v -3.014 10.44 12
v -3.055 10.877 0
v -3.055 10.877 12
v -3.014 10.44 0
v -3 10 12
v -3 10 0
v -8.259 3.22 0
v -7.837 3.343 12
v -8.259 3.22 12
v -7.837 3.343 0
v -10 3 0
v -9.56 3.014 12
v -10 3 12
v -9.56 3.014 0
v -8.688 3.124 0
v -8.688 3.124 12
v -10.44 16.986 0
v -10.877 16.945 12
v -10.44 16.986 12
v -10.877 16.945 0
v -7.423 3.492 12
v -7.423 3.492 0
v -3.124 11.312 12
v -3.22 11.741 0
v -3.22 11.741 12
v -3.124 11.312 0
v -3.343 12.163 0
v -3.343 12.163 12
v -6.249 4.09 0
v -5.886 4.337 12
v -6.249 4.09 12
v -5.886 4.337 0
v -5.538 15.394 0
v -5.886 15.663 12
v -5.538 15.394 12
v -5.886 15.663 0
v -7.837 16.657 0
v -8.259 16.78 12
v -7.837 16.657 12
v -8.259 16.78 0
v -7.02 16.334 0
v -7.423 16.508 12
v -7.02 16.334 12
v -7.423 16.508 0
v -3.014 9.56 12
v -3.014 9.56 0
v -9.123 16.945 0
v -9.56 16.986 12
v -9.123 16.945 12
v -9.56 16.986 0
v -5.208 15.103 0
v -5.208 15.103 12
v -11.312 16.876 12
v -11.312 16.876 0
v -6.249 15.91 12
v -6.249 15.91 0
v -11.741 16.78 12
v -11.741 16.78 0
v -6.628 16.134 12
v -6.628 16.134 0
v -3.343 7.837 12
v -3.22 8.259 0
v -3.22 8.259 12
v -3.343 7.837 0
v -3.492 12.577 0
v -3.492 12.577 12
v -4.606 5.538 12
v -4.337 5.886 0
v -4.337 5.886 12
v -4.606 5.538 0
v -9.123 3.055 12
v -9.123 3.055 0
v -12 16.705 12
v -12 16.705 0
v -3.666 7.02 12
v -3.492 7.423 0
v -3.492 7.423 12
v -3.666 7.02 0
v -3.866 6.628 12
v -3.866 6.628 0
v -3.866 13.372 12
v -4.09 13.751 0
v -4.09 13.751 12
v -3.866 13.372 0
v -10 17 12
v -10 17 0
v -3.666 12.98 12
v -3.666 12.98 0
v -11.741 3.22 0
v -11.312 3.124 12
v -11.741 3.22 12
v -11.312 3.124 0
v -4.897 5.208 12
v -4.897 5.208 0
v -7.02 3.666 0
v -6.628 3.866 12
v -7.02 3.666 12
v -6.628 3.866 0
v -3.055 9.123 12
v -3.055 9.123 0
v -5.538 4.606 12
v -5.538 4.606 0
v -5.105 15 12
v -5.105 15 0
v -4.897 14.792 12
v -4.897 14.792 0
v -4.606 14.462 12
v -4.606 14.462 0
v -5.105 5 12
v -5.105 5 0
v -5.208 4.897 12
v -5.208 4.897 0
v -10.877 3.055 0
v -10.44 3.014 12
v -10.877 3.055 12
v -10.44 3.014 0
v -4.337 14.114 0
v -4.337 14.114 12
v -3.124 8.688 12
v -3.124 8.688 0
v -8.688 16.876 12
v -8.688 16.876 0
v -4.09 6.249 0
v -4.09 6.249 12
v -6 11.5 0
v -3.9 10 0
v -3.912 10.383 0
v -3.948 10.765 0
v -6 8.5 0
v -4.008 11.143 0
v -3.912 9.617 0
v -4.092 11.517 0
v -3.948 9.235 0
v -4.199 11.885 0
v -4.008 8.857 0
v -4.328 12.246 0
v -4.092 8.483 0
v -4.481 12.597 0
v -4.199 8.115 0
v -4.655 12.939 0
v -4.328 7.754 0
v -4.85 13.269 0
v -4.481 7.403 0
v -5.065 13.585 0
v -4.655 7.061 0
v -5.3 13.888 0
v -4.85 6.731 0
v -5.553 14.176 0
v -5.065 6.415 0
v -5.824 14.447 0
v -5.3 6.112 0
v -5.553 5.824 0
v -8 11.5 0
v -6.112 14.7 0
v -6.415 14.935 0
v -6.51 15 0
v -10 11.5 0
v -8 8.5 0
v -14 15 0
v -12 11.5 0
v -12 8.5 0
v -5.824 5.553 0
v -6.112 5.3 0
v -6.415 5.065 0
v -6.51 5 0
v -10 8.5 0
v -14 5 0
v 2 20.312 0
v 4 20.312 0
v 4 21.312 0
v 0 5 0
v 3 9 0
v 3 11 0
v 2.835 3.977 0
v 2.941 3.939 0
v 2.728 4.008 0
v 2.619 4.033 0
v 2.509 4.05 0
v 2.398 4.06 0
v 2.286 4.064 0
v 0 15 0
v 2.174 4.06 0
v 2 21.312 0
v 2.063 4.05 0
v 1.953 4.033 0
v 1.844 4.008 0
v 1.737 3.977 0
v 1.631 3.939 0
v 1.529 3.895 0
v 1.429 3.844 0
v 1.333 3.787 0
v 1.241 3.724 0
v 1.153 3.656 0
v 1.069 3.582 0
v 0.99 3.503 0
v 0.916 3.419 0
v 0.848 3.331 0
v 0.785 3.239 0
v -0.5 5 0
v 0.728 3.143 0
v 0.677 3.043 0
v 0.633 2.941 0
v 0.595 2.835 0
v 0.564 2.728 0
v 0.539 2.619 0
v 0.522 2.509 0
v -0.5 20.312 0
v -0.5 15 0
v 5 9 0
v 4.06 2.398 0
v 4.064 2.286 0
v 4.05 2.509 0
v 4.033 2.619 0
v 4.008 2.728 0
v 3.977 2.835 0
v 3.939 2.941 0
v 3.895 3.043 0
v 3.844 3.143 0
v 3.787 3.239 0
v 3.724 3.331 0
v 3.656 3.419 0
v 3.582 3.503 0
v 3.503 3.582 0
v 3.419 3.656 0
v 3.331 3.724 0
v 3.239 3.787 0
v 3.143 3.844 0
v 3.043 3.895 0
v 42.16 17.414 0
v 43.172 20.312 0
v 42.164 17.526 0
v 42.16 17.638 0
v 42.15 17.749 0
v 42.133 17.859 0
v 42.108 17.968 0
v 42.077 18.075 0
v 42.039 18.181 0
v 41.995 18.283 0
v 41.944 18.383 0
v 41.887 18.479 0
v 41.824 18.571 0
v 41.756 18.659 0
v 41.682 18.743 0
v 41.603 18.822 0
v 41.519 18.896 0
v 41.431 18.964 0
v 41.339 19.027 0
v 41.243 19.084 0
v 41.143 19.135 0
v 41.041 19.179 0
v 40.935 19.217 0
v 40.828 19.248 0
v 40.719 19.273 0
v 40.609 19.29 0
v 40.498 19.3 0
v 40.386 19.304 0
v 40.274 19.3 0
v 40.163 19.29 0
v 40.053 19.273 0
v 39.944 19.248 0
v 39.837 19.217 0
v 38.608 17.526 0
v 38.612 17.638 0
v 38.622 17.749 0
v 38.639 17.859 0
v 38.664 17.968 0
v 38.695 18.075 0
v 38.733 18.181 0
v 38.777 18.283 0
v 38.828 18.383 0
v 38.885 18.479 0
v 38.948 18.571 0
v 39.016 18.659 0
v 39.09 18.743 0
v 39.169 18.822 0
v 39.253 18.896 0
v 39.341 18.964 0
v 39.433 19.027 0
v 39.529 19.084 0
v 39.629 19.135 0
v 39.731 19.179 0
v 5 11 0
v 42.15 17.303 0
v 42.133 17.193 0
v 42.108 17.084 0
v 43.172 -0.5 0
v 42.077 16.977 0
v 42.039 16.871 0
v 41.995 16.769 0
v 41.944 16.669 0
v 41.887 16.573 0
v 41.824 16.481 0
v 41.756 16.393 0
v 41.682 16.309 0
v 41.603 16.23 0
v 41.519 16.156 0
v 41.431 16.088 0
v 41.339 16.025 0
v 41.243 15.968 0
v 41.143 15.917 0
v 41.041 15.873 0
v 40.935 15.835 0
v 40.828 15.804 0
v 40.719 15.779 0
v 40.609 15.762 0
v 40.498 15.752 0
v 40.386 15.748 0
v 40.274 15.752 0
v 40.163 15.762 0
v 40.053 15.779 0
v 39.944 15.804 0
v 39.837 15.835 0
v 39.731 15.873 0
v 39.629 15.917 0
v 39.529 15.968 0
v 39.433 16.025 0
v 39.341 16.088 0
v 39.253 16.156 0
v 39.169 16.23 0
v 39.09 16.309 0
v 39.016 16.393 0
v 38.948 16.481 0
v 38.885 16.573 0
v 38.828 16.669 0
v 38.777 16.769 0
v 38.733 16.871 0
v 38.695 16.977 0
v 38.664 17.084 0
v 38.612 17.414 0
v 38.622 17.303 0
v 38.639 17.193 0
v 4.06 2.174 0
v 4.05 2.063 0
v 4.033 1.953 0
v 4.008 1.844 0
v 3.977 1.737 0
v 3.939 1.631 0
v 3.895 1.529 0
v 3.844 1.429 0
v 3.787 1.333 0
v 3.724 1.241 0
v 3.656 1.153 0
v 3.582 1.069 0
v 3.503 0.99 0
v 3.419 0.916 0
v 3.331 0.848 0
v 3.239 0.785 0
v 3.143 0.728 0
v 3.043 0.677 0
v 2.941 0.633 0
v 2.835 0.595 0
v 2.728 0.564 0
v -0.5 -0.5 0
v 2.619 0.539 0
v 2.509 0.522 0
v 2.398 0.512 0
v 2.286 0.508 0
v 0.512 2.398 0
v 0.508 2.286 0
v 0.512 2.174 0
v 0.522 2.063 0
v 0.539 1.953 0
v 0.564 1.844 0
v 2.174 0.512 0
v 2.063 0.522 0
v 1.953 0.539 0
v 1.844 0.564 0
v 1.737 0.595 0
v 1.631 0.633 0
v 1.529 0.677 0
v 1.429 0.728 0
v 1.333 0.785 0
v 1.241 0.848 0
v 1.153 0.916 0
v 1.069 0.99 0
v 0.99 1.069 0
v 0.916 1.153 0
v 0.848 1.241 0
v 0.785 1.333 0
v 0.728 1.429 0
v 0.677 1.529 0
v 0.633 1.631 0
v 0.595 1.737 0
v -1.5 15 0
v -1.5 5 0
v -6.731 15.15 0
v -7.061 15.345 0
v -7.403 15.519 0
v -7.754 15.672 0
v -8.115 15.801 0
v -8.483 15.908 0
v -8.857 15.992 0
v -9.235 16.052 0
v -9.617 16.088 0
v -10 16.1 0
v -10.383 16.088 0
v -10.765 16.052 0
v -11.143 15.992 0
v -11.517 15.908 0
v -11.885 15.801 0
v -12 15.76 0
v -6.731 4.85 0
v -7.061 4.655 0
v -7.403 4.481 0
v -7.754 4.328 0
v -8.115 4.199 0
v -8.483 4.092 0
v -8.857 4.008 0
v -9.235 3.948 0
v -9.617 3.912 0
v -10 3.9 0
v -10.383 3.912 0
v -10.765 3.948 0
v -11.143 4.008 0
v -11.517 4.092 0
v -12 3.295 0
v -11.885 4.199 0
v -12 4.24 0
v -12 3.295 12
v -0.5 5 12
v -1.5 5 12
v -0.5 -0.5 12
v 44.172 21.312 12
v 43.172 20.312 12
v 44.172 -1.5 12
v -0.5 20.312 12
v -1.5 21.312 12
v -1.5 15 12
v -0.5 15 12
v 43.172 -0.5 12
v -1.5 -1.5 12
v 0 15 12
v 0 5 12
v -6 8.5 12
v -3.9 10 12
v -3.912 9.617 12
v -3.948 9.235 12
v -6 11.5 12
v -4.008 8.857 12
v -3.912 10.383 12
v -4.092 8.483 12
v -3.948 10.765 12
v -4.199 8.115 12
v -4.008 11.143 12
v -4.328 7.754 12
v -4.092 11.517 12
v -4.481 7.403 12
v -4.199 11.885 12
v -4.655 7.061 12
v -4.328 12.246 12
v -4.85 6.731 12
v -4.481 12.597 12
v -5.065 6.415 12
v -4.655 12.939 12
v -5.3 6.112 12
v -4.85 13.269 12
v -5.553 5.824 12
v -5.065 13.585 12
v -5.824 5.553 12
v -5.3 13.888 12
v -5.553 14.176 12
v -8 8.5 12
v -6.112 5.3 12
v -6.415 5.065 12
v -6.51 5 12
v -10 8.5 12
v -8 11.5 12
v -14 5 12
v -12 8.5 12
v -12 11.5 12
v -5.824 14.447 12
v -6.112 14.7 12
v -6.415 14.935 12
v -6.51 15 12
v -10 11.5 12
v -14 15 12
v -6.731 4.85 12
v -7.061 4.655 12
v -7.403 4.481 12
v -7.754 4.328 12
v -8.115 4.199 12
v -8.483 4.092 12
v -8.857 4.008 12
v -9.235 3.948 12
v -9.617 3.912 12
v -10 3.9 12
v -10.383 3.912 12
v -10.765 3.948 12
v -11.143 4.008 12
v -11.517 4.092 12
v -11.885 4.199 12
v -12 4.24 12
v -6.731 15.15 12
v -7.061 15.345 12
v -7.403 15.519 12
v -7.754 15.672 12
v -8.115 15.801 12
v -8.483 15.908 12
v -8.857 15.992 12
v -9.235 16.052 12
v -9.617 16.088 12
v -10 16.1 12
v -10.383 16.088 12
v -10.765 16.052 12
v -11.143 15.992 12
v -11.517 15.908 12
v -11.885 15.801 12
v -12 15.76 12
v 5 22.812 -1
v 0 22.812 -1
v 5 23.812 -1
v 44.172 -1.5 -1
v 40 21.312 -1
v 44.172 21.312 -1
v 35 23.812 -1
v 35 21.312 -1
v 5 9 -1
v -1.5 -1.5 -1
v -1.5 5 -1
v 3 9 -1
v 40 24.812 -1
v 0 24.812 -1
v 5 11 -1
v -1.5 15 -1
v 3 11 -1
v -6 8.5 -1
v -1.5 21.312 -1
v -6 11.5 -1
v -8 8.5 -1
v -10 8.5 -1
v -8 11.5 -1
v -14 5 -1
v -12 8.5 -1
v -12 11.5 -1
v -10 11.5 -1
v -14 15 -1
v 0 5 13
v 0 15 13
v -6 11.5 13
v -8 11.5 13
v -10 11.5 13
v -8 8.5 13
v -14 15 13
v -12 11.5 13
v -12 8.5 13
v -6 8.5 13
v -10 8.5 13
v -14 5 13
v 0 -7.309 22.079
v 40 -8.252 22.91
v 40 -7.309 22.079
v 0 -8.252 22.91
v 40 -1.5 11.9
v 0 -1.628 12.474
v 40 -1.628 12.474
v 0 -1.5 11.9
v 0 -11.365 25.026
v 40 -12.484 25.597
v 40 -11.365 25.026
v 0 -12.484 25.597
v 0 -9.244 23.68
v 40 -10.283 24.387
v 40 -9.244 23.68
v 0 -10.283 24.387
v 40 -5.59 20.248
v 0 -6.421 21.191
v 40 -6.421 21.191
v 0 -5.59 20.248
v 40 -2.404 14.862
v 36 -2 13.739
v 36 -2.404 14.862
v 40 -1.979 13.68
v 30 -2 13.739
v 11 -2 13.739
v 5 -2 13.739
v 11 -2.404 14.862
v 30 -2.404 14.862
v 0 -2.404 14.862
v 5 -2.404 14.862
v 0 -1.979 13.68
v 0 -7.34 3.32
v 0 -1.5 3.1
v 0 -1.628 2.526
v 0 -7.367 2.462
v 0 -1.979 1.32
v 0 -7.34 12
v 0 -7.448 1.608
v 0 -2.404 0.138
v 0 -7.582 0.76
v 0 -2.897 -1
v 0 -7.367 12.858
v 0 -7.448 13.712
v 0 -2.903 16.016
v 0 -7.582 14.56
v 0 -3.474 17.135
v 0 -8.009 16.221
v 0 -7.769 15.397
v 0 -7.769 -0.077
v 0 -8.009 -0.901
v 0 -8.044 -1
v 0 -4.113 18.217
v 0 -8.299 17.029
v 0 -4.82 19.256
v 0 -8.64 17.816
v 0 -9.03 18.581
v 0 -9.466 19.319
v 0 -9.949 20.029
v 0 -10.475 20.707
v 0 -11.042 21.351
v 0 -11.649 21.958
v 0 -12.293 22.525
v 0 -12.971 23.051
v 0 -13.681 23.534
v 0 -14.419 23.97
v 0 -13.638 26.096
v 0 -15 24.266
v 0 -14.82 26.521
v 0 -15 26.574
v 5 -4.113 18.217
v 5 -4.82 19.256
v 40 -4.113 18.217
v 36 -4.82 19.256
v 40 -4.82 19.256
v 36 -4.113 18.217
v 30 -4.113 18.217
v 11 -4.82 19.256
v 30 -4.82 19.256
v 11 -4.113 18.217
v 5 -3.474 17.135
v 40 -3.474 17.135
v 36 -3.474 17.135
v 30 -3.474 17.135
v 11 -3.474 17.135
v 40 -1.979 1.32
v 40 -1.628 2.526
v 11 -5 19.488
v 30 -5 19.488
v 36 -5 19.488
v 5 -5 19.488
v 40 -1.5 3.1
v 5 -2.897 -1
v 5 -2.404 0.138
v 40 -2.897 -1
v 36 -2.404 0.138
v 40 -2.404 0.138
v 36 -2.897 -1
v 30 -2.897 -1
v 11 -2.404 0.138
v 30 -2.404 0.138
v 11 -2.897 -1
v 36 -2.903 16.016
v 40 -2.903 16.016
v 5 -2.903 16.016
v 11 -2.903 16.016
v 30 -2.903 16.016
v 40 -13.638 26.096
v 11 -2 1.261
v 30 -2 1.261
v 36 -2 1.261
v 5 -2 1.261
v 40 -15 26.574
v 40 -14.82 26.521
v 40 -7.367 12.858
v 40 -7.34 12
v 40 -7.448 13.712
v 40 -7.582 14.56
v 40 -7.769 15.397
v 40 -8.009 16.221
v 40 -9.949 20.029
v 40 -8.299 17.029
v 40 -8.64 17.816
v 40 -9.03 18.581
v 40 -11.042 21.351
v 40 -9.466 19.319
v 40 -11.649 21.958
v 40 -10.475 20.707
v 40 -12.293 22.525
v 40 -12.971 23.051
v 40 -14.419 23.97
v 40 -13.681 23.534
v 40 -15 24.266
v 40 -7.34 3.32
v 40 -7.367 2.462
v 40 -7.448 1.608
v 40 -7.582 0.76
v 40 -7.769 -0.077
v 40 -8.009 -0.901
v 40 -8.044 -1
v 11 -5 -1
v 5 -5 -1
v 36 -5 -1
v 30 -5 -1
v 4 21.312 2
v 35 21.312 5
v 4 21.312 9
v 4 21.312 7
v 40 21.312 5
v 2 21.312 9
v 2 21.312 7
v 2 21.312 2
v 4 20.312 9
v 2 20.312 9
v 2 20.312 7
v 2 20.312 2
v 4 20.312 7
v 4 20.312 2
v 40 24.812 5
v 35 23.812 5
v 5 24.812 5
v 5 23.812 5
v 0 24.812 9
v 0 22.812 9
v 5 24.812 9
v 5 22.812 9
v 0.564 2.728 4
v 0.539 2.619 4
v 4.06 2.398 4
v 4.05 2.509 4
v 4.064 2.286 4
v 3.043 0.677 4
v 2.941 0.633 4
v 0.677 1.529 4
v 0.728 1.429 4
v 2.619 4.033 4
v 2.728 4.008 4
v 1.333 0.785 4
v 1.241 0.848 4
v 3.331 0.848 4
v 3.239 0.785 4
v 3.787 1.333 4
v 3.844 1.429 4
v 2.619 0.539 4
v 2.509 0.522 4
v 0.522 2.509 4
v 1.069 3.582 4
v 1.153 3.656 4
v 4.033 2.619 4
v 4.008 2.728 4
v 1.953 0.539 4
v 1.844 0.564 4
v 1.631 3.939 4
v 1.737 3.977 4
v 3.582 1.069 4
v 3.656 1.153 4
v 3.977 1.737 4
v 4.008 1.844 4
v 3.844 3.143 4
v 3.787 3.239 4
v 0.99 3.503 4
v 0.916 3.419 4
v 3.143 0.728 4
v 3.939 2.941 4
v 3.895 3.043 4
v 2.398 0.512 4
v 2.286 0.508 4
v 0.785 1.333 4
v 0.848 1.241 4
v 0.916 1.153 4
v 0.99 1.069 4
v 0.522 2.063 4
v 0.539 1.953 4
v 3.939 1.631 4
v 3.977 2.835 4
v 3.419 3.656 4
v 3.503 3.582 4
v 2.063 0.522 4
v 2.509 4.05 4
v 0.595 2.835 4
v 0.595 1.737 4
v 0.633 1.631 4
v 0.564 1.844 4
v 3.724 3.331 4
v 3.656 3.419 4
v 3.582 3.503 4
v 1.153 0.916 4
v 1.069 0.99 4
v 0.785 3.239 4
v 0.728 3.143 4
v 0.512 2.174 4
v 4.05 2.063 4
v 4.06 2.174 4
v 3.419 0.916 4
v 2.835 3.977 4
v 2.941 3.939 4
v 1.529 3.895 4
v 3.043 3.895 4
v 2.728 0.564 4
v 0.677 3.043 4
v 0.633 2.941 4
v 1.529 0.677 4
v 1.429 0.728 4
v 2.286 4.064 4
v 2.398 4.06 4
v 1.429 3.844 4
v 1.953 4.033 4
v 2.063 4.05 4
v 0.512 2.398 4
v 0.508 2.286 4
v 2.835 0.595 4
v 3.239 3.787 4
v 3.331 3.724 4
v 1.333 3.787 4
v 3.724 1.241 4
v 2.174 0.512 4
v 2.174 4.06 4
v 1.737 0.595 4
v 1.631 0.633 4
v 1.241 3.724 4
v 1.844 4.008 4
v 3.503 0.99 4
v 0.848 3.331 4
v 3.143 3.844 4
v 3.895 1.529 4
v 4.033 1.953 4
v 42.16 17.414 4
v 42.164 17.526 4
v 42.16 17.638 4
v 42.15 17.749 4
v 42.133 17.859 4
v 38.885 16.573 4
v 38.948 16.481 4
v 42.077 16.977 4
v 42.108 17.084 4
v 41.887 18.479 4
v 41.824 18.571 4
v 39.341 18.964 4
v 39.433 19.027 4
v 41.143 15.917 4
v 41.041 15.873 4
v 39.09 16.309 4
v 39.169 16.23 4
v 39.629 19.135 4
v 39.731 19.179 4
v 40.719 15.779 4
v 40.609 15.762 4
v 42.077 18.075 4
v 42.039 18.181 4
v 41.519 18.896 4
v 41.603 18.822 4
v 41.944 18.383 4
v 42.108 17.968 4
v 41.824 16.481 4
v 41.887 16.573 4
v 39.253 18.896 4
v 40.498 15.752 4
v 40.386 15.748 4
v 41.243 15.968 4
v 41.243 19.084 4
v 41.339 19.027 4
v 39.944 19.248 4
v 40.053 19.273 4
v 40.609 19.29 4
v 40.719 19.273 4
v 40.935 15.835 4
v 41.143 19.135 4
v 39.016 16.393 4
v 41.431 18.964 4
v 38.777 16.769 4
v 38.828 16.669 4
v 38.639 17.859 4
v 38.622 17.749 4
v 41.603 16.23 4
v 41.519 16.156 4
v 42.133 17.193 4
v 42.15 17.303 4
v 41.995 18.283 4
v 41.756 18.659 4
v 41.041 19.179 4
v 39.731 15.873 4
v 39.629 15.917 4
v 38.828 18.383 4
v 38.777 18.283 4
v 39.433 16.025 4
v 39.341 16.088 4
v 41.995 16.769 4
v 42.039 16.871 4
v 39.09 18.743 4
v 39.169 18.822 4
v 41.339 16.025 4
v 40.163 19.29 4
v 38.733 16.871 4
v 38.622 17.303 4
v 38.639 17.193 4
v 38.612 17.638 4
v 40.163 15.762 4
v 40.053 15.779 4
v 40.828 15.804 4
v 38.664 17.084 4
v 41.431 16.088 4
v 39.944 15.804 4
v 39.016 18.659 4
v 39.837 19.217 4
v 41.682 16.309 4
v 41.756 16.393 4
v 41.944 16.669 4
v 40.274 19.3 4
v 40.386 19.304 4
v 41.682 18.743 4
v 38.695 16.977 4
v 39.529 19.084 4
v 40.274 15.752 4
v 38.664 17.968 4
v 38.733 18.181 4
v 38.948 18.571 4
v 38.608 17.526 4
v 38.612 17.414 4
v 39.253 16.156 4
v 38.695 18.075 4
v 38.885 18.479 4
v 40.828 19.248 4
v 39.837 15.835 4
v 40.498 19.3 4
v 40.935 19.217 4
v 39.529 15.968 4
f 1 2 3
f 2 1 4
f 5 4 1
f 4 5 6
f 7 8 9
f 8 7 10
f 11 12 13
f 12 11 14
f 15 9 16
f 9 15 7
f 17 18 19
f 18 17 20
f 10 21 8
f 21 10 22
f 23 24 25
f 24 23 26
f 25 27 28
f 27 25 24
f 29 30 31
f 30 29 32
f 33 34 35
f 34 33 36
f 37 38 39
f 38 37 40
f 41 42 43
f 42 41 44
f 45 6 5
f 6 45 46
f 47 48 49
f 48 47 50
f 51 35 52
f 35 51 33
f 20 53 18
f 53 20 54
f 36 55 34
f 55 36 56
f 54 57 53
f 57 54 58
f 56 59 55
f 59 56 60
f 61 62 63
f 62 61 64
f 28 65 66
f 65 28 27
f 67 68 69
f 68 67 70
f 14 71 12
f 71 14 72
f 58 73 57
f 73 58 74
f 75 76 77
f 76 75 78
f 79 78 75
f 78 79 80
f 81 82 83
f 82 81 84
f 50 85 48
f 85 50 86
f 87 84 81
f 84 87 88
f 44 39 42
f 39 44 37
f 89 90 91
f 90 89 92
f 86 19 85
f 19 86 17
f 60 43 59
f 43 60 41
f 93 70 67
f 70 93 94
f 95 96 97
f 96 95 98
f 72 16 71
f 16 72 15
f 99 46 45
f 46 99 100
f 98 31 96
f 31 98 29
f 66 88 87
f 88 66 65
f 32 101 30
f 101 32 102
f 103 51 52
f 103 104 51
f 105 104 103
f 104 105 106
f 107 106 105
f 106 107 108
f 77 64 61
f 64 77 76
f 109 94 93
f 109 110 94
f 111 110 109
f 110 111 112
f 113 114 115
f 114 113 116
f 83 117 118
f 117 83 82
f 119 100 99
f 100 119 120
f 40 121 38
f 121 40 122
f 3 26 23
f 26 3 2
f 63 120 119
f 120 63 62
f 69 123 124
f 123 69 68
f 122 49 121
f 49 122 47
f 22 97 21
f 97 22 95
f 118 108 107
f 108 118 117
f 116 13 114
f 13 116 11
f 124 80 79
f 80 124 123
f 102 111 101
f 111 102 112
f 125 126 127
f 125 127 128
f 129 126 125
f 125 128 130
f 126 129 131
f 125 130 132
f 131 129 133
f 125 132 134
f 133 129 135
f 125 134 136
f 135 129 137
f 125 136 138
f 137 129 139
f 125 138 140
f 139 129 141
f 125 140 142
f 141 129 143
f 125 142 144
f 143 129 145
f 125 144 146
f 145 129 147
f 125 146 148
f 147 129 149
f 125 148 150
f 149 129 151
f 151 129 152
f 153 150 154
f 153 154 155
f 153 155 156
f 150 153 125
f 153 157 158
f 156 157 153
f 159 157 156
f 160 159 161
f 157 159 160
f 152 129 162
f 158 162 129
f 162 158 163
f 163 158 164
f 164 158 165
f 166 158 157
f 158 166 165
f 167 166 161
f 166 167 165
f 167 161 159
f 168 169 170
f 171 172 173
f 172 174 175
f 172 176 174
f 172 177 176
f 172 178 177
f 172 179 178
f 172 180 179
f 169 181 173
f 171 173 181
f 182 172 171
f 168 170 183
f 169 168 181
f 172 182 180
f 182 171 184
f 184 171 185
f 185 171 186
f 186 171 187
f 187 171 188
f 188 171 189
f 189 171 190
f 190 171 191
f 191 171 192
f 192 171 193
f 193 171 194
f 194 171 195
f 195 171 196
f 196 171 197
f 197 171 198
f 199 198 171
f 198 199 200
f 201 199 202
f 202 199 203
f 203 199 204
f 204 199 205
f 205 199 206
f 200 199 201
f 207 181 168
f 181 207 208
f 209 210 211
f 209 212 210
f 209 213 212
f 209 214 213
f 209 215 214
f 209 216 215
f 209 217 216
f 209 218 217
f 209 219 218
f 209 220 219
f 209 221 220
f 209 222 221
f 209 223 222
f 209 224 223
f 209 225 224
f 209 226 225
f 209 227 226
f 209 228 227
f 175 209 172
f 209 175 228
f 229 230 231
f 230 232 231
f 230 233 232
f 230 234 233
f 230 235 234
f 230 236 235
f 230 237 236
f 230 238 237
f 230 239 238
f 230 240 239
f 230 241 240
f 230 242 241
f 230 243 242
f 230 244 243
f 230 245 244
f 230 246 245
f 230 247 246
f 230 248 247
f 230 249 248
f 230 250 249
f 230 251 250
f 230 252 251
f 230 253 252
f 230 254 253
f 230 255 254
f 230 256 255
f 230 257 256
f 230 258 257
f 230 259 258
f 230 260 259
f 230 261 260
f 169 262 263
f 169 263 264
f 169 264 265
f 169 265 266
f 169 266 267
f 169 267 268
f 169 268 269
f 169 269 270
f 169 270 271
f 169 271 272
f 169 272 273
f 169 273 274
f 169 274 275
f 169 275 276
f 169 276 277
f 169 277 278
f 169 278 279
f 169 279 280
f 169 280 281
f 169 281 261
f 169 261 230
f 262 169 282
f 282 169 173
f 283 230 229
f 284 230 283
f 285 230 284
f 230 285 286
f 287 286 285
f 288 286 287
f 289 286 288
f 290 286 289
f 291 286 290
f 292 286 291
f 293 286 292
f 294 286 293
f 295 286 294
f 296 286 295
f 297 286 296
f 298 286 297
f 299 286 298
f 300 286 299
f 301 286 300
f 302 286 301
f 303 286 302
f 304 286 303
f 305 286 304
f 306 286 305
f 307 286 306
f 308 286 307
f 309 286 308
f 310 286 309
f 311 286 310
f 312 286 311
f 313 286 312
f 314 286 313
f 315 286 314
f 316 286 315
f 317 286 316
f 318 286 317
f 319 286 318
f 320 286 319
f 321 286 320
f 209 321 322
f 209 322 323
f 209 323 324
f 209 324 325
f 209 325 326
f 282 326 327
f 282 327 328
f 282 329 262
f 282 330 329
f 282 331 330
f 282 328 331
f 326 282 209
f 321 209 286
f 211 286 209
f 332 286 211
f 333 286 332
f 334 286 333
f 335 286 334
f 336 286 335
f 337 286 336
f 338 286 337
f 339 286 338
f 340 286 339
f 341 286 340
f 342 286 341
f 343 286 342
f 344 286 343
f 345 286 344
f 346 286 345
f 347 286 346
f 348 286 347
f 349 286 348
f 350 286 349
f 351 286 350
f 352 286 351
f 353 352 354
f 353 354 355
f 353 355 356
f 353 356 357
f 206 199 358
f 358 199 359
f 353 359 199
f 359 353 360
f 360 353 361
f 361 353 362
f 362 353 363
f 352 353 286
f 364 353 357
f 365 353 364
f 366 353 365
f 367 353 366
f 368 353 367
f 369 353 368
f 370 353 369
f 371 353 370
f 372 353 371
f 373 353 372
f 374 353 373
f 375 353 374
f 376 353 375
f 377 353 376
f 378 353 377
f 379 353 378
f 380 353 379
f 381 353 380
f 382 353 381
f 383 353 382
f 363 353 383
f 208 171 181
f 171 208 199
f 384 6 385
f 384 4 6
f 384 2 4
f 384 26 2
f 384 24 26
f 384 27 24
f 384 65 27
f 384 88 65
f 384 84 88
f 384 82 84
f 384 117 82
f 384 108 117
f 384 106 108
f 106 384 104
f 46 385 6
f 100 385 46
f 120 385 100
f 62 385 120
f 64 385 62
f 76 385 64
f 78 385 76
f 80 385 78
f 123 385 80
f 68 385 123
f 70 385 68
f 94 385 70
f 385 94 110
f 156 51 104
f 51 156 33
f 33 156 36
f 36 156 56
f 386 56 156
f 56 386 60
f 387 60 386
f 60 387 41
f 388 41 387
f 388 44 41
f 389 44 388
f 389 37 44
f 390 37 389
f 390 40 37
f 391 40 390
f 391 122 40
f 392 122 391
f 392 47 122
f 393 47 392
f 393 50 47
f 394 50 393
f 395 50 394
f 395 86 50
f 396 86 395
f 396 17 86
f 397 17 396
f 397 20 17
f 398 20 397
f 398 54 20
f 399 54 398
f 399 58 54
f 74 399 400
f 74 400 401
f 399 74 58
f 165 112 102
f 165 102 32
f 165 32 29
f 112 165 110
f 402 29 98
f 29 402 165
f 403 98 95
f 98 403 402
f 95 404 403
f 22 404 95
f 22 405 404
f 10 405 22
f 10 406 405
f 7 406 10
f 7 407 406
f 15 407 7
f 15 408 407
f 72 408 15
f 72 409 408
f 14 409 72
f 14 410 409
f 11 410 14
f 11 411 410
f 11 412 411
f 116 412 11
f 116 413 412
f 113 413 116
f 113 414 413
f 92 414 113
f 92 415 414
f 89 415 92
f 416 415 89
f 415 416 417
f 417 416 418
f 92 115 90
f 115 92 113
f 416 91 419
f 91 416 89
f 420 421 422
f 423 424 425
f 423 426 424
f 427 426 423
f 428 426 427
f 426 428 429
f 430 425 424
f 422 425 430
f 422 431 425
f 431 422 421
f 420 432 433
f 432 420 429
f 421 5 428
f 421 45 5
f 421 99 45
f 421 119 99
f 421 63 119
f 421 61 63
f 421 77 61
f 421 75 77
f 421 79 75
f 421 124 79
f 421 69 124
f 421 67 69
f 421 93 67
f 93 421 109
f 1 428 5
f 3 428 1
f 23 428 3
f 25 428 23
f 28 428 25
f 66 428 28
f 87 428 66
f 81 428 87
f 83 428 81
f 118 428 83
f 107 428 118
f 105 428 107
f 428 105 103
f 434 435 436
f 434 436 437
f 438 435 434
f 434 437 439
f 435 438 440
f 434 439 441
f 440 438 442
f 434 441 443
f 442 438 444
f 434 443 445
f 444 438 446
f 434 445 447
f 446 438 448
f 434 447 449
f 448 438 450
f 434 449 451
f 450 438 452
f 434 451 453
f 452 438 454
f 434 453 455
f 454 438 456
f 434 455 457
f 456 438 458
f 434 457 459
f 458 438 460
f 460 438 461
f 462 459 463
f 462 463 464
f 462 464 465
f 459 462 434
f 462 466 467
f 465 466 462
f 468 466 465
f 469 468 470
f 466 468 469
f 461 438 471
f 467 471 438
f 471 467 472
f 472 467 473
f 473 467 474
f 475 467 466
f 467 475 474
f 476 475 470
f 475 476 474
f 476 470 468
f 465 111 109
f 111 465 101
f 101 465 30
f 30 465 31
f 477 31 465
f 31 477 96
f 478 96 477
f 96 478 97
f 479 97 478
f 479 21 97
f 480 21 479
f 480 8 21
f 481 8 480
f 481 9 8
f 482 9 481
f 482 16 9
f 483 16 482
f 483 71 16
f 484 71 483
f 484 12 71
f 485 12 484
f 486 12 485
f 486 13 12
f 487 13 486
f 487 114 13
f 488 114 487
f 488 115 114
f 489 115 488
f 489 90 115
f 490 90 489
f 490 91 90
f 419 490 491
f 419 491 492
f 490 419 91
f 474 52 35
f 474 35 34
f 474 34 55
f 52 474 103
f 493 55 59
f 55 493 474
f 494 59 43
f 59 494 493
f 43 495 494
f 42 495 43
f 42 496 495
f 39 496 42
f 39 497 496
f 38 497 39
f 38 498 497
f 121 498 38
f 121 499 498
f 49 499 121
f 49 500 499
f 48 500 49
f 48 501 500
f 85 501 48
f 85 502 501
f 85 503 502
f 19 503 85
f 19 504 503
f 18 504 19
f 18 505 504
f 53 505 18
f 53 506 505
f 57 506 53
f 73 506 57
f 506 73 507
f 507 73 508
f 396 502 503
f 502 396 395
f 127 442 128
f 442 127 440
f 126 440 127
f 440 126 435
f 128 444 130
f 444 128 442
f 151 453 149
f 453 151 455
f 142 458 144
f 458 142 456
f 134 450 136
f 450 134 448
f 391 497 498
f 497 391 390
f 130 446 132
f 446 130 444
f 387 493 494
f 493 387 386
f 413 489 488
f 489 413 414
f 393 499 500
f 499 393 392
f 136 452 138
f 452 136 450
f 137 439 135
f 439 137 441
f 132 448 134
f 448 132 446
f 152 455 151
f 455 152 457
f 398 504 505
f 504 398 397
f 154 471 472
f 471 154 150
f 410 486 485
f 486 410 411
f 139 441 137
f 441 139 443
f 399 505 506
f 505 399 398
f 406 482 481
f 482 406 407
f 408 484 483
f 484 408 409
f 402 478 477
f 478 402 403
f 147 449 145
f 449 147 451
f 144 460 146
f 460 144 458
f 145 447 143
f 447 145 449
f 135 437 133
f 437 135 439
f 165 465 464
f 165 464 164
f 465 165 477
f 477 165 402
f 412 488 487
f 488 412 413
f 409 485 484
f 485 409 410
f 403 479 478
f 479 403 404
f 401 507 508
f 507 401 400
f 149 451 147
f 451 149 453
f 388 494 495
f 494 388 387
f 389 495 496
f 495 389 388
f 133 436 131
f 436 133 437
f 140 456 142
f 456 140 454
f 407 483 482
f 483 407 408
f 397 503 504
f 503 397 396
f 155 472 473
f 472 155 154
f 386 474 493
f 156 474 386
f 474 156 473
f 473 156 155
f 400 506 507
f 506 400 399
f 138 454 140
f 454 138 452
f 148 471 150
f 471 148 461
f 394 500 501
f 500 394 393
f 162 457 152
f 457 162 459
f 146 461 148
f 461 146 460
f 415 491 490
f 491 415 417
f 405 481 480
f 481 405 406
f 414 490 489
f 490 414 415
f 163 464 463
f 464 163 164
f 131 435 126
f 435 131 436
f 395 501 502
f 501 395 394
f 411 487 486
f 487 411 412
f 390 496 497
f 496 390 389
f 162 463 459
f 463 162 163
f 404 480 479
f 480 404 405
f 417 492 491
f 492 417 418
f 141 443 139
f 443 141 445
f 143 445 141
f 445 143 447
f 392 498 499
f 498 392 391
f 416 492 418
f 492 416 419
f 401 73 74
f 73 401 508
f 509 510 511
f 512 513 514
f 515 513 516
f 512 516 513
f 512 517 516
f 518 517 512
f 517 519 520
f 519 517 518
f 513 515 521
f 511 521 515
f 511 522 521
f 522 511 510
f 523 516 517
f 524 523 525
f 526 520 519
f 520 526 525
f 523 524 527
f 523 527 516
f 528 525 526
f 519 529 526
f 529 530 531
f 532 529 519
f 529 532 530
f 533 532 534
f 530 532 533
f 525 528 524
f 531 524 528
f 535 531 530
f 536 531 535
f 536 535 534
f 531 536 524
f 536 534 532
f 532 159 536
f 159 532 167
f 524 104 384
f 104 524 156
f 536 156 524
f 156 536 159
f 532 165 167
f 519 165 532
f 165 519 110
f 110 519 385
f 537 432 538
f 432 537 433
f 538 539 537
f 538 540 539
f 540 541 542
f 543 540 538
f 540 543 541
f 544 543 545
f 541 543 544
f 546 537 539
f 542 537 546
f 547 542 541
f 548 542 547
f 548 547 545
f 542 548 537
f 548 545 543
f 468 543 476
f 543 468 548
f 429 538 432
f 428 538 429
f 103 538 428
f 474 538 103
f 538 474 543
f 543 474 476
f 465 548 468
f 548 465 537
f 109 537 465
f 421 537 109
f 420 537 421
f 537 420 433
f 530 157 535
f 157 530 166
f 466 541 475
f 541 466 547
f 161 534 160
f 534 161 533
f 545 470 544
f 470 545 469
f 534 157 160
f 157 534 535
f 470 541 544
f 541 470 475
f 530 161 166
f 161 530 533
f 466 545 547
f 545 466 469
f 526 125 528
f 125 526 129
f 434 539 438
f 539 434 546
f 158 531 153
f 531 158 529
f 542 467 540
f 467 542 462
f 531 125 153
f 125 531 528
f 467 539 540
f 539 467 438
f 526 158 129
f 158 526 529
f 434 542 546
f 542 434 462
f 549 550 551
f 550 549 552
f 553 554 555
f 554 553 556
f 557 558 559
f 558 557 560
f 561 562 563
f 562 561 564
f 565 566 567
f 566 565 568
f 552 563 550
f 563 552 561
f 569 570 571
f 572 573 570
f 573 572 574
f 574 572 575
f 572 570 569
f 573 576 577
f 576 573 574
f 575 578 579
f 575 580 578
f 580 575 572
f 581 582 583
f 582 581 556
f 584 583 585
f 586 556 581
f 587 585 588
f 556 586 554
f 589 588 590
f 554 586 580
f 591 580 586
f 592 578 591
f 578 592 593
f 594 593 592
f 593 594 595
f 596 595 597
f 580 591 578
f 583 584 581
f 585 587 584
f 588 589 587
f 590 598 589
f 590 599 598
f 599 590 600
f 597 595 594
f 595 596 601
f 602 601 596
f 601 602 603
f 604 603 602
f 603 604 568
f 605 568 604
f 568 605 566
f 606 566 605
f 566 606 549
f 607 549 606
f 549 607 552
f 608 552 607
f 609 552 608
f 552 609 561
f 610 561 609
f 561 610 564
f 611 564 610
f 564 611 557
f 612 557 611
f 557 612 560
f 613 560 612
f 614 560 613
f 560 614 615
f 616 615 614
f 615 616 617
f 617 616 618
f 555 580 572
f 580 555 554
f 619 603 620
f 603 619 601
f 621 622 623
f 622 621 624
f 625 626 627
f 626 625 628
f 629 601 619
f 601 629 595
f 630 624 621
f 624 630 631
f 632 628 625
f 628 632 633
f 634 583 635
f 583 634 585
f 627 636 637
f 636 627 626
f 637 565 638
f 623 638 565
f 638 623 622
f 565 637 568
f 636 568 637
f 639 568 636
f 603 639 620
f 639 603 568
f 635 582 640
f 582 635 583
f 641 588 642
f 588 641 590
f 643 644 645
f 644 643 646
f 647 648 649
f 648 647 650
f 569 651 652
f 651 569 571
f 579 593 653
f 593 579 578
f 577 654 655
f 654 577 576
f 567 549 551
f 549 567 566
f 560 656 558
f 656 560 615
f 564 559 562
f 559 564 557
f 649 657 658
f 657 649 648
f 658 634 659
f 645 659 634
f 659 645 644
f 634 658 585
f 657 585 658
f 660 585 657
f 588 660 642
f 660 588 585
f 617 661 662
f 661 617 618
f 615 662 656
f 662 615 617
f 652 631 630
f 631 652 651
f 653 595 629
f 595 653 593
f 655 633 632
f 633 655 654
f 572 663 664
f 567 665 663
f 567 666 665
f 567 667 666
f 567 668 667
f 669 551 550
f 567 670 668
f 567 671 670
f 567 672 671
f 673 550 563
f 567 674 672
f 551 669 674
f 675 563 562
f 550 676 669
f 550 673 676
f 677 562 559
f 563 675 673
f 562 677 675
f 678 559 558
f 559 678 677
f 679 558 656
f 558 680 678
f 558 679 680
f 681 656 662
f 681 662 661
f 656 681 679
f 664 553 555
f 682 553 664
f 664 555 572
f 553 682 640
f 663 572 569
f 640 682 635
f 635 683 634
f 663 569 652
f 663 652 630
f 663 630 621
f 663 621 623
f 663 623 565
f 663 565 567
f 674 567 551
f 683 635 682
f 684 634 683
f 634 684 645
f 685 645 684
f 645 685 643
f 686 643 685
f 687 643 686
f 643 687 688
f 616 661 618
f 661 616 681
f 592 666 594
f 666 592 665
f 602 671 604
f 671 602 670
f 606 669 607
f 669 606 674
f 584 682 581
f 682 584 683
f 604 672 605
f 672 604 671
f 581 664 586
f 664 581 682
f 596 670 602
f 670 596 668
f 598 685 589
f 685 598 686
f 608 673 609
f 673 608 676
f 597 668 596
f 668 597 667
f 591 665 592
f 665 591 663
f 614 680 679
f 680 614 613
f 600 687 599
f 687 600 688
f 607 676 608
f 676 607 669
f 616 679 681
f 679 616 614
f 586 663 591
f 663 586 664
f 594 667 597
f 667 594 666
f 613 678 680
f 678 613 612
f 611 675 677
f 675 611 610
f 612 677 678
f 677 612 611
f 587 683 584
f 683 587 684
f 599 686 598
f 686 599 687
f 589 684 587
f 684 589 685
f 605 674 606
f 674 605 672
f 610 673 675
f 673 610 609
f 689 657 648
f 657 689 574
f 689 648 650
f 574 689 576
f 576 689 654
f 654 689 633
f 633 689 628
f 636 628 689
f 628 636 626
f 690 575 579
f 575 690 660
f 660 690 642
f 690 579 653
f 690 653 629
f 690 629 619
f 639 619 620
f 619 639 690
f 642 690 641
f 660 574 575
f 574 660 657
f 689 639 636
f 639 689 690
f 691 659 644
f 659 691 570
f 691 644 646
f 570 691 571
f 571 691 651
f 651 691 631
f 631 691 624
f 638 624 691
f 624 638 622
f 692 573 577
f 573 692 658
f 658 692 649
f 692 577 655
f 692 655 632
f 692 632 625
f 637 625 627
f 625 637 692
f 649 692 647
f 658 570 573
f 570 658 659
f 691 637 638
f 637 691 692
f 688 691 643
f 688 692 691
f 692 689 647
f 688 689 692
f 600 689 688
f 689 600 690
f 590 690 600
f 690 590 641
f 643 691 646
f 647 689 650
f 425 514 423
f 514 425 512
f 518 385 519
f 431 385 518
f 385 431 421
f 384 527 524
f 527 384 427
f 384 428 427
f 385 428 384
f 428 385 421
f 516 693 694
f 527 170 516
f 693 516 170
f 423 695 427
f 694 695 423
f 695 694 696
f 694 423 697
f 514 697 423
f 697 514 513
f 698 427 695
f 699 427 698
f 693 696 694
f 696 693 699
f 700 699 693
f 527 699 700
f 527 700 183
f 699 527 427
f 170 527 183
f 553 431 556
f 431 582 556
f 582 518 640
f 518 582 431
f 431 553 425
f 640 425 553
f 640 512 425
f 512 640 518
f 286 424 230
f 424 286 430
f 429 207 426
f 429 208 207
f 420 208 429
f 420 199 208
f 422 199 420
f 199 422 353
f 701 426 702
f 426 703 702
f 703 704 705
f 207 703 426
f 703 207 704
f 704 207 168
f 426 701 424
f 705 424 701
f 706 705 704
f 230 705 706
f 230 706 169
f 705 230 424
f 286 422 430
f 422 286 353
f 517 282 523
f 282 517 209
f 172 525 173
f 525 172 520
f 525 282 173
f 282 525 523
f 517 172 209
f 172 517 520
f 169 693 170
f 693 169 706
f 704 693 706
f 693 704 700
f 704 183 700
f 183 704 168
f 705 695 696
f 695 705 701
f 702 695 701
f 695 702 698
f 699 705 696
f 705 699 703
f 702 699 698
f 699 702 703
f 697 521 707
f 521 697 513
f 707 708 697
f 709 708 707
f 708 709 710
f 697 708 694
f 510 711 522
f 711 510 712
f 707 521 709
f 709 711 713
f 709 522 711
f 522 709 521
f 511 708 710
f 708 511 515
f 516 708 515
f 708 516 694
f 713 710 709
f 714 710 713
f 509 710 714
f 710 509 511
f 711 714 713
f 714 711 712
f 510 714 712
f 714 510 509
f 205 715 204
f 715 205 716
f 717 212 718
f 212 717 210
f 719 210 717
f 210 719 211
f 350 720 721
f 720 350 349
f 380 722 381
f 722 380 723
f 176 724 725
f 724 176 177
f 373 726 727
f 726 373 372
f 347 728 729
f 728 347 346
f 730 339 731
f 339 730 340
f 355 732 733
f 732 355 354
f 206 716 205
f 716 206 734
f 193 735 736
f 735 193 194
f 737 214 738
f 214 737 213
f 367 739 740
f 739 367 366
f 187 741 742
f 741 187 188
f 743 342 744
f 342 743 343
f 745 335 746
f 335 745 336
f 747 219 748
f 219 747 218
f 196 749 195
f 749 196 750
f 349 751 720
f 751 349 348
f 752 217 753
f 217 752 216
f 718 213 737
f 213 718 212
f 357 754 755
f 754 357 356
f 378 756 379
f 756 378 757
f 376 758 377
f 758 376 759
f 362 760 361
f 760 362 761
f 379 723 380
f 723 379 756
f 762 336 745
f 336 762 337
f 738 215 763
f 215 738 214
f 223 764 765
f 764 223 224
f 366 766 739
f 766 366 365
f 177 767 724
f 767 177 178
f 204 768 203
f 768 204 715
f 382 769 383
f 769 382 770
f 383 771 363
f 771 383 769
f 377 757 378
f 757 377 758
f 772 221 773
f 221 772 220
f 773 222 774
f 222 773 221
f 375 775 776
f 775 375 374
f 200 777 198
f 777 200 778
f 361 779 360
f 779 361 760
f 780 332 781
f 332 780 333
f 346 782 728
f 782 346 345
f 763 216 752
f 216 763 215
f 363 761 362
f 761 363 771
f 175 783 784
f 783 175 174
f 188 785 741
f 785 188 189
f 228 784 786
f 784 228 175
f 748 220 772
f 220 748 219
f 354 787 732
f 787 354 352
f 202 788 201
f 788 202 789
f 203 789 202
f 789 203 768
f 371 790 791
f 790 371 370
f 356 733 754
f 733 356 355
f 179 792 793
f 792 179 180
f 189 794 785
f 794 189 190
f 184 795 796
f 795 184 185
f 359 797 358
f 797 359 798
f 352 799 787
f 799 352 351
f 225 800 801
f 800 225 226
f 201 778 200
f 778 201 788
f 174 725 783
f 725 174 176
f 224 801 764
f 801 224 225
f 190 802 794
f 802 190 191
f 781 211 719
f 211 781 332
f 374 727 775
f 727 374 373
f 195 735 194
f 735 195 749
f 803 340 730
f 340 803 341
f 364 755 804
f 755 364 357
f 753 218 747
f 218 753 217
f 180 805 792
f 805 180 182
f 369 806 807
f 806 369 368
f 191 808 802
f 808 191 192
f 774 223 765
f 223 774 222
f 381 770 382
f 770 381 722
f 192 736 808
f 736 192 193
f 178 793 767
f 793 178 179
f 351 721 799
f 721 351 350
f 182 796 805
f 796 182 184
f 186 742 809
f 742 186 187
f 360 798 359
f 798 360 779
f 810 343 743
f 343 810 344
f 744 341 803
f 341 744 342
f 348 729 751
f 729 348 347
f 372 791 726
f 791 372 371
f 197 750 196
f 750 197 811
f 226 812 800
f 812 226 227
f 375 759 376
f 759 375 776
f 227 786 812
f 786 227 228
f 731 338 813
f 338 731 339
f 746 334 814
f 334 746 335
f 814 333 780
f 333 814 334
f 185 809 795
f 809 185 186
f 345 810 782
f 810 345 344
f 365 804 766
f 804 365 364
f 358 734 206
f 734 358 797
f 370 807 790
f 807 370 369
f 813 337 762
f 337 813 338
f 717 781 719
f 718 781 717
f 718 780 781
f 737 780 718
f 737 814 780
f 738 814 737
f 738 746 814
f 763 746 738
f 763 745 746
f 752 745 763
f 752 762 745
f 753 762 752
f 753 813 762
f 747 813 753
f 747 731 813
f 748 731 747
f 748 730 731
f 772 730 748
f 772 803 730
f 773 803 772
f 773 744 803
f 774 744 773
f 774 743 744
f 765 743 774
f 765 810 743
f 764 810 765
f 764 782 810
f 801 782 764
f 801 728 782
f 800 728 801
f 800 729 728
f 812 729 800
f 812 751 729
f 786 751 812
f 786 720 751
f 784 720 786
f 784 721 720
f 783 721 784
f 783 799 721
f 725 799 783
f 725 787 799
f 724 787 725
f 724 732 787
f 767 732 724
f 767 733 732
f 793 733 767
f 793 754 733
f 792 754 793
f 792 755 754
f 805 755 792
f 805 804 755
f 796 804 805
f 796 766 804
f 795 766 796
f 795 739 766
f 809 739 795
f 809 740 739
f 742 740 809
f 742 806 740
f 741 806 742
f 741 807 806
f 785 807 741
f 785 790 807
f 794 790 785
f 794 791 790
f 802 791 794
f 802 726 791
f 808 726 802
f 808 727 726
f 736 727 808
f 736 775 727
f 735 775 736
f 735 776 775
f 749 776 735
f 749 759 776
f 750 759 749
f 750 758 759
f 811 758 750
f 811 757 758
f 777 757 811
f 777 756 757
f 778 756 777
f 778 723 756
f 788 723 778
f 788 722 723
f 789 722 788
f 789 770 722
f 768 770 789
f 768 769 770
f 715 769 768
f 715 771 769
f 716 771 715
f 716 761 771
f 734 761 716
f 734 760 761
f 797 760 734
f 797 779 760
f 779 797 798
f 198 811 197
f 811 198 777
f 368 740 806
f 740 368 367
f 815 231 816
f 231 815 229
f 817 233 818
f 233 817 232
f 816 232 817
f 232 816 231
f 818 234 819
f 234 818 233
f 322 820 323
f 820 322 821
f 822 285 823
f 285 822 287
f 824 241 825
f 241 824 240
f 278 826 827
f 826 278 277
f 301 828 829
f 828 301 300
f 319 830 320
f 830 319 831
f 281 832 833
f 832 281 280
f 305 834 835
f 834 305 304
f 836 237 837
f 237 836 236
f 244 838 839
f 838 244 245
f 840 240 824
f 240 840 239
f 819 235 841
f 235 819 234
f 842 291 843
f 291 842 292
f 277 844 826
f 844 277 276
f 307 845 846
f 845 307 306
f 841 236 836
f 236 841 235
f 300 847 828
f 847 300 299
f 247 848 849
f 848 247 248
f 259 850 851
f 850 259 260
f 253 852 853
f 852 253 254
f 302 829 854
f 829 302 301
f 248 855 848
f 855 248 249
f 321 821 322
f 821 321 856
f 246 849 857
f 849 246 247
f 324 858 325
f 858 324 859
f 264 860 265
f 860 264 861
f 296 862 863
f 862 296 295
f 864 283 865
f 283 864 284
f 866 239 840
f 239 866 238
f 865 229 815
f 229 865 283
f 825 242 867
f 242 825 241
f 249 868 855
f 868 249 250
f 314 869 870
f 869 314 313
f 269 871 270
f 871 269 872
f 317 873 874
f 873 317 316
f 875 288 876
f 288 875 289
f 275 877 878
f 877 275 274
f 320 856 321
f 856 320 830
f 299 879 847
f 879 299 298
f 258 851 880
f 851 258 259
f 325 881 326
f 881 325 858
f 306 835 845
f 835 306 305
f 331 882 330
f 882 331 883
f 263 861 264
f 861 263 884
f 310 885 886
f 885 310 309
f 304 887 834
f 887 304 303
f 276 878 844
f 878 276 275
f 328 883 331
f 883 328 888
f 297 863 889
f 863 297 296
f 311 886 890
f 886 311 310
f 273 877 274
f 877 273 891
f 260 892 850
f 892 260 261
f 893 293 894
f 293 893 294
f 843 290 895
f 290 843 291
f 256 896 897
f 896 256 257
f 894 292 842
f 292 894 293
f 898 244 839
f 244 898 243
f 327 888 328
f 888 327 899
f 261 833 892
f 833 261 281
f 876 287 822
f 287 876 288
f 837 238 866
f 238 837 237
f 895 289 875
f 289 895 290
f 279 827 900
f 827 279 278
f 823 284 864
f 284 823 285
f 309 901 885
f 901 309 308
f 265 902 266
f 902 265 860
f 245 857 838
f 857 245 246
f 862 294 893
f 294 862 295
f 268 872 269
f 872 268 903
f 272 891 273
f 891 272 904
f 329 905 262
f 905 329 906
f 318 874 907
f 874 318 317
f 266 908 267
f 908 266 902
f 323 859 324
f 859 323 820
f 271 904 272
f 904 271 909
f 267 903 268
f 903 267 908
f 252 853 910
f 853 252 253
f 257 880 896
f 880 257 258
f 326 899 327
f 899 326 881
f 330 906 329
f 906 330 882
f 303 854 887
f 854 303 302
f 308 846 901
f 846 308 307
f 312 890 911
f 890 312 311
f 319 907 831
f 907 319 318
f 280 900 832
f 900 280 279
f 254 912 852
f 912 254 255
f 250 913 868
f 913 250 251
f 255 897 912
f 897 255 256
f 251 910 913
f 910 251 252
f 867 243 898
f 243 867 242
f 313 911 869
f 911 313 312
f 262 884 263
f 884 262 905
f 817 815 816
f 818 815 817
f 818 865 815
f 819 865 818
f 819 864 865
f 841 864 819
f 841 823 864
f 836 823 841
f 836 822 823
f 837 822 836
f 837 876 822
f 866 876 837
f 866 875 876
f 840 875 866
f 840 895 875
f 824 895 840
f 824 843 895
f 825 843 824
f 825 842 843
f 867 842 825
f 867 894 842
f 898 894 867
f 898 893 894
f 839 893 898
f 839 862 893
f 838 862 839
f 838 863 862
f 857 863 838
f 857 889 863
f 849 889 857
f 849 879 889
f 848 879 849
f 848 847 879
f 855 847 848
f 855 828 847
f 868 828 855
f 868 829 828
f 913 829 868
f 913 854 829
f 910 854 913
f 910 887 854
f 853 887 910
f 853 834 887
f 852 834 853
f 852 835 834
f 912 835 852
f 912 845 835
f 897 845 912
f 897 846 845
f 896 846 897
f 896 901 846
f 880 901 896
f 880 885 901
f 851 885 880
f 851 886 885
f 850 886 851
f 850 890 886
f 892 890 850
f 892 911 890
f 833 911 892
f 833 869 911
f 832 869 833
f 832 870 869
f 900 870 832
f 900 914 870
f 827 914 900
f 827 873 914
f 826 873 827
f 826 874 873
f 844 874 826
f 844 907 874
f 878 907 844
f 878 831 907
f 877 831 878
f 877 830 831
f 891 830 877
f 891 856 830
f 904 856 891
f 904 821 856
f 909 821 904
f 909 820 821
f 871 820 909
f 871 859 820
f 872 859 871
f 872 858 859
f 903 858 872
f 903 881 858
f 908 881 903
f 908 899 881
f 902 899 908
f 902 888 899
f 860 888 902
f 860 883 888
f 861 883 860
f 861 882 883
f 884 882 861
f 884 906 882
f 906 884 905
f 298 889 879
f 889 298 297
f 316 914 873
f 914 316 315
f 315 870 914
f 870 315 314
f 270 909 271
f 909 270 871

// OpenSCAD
PCB_LENGTH = 1.68*25.4;
PCB_WIDTH = 0.78*25.4;

$fn=100;

//cube([PCB_LENGTH, PCB_WIDTH, 0.5*25.4]);

translate([-10,10,0]) rotate([0,0,0]) {
    // Batteries
    //cylinder(5, 6, 6);
    //translate([0,0,6]) cylinder(5, 6, 6);

    // Battery holder
    difference() {
        cylinder(12, 7, 7);
        cylinder(12, 6.1, 6.1);
        translate([-12,-50,0]) cube([10, 100, 100]);
    }

    difference() {
        union() {
            // Clasp on bottom
            translate([-4,-5,-1]) cube([14,10,1]);
        
            // Clasp on top
            translate([-4,-5,12]) cube([14, 10, 1]);
        }

        translate([-2,-1.5,-50]) cube([2,3,100]);
        translate([2,-1.5,-50]) cube([2,3,100]);
    }
}

// The steering wheel positive
translate([0,-3,5]) difference() {
    translate([0,-18,2.5]) rotate([0,90,0]) cylinder(40, 20,20);
    translate([0,-30-18,-25]) cube([40, 36,50]);

    // The steering wheel negative
    translate([-40,-18,7]) rotate([0,90,0]) hull() {
        cylinder(100, 27.32/2, 27.32/2);
        translate([36-27.32,0,0]) cylinder(100, 27.32/2, 27.32/2);
    }
    
    // The holes for the zipties
    translate([5,-2,-50]) cube([6, 3, 100]);
    translate([30,-2,-50]) cube([6, 3, 100]);
    
    // Cut off the bottom part so it prints flat
    translate([0,-50,-106]) cube([100,100,100]);
}

// The PCB mounting posts
translate([0.09*25.4, (0.78-0.69)*25.4, 0]) cylinder(4, 0.07*25.4, 0.07*25.4);
translate([1.59*25.4, (0.78-0.09)*25.4, 0]) cylinder(4, 0.07*25.4, 0.07*25.4);

// The box holding the PCB
difference() {
    translate([-1.5, -1.5, -1]) cube([PCB_LENGTH+3, PCB_WIDTH+3, 13]);
    translate([-0.5, -0.5, 0]) cube([PCB_LENGTH+1, PCB_WIDTH+1, 13]);
    
    // Hole for the battery wire
    translate([3,9,-50]) cube([2,2,100]);
    
    // Holes for the two contact wires
    translate([2, 0, 0]) cube([2, 100, 2]);
    translate([2, 0, 7]) cube([2, 100, 2]);
}

// The trigger switch
translate([0, PCB_WIDTH+4, -1]) {
    cube([40, 1, 6]);
    
    // The pivot
    translate([40-5, -3, 0]) cube([5, 3, 6]);
    
    // The contact
    translate([0, -1, 0]) cube([5, 2, 10]);
}
